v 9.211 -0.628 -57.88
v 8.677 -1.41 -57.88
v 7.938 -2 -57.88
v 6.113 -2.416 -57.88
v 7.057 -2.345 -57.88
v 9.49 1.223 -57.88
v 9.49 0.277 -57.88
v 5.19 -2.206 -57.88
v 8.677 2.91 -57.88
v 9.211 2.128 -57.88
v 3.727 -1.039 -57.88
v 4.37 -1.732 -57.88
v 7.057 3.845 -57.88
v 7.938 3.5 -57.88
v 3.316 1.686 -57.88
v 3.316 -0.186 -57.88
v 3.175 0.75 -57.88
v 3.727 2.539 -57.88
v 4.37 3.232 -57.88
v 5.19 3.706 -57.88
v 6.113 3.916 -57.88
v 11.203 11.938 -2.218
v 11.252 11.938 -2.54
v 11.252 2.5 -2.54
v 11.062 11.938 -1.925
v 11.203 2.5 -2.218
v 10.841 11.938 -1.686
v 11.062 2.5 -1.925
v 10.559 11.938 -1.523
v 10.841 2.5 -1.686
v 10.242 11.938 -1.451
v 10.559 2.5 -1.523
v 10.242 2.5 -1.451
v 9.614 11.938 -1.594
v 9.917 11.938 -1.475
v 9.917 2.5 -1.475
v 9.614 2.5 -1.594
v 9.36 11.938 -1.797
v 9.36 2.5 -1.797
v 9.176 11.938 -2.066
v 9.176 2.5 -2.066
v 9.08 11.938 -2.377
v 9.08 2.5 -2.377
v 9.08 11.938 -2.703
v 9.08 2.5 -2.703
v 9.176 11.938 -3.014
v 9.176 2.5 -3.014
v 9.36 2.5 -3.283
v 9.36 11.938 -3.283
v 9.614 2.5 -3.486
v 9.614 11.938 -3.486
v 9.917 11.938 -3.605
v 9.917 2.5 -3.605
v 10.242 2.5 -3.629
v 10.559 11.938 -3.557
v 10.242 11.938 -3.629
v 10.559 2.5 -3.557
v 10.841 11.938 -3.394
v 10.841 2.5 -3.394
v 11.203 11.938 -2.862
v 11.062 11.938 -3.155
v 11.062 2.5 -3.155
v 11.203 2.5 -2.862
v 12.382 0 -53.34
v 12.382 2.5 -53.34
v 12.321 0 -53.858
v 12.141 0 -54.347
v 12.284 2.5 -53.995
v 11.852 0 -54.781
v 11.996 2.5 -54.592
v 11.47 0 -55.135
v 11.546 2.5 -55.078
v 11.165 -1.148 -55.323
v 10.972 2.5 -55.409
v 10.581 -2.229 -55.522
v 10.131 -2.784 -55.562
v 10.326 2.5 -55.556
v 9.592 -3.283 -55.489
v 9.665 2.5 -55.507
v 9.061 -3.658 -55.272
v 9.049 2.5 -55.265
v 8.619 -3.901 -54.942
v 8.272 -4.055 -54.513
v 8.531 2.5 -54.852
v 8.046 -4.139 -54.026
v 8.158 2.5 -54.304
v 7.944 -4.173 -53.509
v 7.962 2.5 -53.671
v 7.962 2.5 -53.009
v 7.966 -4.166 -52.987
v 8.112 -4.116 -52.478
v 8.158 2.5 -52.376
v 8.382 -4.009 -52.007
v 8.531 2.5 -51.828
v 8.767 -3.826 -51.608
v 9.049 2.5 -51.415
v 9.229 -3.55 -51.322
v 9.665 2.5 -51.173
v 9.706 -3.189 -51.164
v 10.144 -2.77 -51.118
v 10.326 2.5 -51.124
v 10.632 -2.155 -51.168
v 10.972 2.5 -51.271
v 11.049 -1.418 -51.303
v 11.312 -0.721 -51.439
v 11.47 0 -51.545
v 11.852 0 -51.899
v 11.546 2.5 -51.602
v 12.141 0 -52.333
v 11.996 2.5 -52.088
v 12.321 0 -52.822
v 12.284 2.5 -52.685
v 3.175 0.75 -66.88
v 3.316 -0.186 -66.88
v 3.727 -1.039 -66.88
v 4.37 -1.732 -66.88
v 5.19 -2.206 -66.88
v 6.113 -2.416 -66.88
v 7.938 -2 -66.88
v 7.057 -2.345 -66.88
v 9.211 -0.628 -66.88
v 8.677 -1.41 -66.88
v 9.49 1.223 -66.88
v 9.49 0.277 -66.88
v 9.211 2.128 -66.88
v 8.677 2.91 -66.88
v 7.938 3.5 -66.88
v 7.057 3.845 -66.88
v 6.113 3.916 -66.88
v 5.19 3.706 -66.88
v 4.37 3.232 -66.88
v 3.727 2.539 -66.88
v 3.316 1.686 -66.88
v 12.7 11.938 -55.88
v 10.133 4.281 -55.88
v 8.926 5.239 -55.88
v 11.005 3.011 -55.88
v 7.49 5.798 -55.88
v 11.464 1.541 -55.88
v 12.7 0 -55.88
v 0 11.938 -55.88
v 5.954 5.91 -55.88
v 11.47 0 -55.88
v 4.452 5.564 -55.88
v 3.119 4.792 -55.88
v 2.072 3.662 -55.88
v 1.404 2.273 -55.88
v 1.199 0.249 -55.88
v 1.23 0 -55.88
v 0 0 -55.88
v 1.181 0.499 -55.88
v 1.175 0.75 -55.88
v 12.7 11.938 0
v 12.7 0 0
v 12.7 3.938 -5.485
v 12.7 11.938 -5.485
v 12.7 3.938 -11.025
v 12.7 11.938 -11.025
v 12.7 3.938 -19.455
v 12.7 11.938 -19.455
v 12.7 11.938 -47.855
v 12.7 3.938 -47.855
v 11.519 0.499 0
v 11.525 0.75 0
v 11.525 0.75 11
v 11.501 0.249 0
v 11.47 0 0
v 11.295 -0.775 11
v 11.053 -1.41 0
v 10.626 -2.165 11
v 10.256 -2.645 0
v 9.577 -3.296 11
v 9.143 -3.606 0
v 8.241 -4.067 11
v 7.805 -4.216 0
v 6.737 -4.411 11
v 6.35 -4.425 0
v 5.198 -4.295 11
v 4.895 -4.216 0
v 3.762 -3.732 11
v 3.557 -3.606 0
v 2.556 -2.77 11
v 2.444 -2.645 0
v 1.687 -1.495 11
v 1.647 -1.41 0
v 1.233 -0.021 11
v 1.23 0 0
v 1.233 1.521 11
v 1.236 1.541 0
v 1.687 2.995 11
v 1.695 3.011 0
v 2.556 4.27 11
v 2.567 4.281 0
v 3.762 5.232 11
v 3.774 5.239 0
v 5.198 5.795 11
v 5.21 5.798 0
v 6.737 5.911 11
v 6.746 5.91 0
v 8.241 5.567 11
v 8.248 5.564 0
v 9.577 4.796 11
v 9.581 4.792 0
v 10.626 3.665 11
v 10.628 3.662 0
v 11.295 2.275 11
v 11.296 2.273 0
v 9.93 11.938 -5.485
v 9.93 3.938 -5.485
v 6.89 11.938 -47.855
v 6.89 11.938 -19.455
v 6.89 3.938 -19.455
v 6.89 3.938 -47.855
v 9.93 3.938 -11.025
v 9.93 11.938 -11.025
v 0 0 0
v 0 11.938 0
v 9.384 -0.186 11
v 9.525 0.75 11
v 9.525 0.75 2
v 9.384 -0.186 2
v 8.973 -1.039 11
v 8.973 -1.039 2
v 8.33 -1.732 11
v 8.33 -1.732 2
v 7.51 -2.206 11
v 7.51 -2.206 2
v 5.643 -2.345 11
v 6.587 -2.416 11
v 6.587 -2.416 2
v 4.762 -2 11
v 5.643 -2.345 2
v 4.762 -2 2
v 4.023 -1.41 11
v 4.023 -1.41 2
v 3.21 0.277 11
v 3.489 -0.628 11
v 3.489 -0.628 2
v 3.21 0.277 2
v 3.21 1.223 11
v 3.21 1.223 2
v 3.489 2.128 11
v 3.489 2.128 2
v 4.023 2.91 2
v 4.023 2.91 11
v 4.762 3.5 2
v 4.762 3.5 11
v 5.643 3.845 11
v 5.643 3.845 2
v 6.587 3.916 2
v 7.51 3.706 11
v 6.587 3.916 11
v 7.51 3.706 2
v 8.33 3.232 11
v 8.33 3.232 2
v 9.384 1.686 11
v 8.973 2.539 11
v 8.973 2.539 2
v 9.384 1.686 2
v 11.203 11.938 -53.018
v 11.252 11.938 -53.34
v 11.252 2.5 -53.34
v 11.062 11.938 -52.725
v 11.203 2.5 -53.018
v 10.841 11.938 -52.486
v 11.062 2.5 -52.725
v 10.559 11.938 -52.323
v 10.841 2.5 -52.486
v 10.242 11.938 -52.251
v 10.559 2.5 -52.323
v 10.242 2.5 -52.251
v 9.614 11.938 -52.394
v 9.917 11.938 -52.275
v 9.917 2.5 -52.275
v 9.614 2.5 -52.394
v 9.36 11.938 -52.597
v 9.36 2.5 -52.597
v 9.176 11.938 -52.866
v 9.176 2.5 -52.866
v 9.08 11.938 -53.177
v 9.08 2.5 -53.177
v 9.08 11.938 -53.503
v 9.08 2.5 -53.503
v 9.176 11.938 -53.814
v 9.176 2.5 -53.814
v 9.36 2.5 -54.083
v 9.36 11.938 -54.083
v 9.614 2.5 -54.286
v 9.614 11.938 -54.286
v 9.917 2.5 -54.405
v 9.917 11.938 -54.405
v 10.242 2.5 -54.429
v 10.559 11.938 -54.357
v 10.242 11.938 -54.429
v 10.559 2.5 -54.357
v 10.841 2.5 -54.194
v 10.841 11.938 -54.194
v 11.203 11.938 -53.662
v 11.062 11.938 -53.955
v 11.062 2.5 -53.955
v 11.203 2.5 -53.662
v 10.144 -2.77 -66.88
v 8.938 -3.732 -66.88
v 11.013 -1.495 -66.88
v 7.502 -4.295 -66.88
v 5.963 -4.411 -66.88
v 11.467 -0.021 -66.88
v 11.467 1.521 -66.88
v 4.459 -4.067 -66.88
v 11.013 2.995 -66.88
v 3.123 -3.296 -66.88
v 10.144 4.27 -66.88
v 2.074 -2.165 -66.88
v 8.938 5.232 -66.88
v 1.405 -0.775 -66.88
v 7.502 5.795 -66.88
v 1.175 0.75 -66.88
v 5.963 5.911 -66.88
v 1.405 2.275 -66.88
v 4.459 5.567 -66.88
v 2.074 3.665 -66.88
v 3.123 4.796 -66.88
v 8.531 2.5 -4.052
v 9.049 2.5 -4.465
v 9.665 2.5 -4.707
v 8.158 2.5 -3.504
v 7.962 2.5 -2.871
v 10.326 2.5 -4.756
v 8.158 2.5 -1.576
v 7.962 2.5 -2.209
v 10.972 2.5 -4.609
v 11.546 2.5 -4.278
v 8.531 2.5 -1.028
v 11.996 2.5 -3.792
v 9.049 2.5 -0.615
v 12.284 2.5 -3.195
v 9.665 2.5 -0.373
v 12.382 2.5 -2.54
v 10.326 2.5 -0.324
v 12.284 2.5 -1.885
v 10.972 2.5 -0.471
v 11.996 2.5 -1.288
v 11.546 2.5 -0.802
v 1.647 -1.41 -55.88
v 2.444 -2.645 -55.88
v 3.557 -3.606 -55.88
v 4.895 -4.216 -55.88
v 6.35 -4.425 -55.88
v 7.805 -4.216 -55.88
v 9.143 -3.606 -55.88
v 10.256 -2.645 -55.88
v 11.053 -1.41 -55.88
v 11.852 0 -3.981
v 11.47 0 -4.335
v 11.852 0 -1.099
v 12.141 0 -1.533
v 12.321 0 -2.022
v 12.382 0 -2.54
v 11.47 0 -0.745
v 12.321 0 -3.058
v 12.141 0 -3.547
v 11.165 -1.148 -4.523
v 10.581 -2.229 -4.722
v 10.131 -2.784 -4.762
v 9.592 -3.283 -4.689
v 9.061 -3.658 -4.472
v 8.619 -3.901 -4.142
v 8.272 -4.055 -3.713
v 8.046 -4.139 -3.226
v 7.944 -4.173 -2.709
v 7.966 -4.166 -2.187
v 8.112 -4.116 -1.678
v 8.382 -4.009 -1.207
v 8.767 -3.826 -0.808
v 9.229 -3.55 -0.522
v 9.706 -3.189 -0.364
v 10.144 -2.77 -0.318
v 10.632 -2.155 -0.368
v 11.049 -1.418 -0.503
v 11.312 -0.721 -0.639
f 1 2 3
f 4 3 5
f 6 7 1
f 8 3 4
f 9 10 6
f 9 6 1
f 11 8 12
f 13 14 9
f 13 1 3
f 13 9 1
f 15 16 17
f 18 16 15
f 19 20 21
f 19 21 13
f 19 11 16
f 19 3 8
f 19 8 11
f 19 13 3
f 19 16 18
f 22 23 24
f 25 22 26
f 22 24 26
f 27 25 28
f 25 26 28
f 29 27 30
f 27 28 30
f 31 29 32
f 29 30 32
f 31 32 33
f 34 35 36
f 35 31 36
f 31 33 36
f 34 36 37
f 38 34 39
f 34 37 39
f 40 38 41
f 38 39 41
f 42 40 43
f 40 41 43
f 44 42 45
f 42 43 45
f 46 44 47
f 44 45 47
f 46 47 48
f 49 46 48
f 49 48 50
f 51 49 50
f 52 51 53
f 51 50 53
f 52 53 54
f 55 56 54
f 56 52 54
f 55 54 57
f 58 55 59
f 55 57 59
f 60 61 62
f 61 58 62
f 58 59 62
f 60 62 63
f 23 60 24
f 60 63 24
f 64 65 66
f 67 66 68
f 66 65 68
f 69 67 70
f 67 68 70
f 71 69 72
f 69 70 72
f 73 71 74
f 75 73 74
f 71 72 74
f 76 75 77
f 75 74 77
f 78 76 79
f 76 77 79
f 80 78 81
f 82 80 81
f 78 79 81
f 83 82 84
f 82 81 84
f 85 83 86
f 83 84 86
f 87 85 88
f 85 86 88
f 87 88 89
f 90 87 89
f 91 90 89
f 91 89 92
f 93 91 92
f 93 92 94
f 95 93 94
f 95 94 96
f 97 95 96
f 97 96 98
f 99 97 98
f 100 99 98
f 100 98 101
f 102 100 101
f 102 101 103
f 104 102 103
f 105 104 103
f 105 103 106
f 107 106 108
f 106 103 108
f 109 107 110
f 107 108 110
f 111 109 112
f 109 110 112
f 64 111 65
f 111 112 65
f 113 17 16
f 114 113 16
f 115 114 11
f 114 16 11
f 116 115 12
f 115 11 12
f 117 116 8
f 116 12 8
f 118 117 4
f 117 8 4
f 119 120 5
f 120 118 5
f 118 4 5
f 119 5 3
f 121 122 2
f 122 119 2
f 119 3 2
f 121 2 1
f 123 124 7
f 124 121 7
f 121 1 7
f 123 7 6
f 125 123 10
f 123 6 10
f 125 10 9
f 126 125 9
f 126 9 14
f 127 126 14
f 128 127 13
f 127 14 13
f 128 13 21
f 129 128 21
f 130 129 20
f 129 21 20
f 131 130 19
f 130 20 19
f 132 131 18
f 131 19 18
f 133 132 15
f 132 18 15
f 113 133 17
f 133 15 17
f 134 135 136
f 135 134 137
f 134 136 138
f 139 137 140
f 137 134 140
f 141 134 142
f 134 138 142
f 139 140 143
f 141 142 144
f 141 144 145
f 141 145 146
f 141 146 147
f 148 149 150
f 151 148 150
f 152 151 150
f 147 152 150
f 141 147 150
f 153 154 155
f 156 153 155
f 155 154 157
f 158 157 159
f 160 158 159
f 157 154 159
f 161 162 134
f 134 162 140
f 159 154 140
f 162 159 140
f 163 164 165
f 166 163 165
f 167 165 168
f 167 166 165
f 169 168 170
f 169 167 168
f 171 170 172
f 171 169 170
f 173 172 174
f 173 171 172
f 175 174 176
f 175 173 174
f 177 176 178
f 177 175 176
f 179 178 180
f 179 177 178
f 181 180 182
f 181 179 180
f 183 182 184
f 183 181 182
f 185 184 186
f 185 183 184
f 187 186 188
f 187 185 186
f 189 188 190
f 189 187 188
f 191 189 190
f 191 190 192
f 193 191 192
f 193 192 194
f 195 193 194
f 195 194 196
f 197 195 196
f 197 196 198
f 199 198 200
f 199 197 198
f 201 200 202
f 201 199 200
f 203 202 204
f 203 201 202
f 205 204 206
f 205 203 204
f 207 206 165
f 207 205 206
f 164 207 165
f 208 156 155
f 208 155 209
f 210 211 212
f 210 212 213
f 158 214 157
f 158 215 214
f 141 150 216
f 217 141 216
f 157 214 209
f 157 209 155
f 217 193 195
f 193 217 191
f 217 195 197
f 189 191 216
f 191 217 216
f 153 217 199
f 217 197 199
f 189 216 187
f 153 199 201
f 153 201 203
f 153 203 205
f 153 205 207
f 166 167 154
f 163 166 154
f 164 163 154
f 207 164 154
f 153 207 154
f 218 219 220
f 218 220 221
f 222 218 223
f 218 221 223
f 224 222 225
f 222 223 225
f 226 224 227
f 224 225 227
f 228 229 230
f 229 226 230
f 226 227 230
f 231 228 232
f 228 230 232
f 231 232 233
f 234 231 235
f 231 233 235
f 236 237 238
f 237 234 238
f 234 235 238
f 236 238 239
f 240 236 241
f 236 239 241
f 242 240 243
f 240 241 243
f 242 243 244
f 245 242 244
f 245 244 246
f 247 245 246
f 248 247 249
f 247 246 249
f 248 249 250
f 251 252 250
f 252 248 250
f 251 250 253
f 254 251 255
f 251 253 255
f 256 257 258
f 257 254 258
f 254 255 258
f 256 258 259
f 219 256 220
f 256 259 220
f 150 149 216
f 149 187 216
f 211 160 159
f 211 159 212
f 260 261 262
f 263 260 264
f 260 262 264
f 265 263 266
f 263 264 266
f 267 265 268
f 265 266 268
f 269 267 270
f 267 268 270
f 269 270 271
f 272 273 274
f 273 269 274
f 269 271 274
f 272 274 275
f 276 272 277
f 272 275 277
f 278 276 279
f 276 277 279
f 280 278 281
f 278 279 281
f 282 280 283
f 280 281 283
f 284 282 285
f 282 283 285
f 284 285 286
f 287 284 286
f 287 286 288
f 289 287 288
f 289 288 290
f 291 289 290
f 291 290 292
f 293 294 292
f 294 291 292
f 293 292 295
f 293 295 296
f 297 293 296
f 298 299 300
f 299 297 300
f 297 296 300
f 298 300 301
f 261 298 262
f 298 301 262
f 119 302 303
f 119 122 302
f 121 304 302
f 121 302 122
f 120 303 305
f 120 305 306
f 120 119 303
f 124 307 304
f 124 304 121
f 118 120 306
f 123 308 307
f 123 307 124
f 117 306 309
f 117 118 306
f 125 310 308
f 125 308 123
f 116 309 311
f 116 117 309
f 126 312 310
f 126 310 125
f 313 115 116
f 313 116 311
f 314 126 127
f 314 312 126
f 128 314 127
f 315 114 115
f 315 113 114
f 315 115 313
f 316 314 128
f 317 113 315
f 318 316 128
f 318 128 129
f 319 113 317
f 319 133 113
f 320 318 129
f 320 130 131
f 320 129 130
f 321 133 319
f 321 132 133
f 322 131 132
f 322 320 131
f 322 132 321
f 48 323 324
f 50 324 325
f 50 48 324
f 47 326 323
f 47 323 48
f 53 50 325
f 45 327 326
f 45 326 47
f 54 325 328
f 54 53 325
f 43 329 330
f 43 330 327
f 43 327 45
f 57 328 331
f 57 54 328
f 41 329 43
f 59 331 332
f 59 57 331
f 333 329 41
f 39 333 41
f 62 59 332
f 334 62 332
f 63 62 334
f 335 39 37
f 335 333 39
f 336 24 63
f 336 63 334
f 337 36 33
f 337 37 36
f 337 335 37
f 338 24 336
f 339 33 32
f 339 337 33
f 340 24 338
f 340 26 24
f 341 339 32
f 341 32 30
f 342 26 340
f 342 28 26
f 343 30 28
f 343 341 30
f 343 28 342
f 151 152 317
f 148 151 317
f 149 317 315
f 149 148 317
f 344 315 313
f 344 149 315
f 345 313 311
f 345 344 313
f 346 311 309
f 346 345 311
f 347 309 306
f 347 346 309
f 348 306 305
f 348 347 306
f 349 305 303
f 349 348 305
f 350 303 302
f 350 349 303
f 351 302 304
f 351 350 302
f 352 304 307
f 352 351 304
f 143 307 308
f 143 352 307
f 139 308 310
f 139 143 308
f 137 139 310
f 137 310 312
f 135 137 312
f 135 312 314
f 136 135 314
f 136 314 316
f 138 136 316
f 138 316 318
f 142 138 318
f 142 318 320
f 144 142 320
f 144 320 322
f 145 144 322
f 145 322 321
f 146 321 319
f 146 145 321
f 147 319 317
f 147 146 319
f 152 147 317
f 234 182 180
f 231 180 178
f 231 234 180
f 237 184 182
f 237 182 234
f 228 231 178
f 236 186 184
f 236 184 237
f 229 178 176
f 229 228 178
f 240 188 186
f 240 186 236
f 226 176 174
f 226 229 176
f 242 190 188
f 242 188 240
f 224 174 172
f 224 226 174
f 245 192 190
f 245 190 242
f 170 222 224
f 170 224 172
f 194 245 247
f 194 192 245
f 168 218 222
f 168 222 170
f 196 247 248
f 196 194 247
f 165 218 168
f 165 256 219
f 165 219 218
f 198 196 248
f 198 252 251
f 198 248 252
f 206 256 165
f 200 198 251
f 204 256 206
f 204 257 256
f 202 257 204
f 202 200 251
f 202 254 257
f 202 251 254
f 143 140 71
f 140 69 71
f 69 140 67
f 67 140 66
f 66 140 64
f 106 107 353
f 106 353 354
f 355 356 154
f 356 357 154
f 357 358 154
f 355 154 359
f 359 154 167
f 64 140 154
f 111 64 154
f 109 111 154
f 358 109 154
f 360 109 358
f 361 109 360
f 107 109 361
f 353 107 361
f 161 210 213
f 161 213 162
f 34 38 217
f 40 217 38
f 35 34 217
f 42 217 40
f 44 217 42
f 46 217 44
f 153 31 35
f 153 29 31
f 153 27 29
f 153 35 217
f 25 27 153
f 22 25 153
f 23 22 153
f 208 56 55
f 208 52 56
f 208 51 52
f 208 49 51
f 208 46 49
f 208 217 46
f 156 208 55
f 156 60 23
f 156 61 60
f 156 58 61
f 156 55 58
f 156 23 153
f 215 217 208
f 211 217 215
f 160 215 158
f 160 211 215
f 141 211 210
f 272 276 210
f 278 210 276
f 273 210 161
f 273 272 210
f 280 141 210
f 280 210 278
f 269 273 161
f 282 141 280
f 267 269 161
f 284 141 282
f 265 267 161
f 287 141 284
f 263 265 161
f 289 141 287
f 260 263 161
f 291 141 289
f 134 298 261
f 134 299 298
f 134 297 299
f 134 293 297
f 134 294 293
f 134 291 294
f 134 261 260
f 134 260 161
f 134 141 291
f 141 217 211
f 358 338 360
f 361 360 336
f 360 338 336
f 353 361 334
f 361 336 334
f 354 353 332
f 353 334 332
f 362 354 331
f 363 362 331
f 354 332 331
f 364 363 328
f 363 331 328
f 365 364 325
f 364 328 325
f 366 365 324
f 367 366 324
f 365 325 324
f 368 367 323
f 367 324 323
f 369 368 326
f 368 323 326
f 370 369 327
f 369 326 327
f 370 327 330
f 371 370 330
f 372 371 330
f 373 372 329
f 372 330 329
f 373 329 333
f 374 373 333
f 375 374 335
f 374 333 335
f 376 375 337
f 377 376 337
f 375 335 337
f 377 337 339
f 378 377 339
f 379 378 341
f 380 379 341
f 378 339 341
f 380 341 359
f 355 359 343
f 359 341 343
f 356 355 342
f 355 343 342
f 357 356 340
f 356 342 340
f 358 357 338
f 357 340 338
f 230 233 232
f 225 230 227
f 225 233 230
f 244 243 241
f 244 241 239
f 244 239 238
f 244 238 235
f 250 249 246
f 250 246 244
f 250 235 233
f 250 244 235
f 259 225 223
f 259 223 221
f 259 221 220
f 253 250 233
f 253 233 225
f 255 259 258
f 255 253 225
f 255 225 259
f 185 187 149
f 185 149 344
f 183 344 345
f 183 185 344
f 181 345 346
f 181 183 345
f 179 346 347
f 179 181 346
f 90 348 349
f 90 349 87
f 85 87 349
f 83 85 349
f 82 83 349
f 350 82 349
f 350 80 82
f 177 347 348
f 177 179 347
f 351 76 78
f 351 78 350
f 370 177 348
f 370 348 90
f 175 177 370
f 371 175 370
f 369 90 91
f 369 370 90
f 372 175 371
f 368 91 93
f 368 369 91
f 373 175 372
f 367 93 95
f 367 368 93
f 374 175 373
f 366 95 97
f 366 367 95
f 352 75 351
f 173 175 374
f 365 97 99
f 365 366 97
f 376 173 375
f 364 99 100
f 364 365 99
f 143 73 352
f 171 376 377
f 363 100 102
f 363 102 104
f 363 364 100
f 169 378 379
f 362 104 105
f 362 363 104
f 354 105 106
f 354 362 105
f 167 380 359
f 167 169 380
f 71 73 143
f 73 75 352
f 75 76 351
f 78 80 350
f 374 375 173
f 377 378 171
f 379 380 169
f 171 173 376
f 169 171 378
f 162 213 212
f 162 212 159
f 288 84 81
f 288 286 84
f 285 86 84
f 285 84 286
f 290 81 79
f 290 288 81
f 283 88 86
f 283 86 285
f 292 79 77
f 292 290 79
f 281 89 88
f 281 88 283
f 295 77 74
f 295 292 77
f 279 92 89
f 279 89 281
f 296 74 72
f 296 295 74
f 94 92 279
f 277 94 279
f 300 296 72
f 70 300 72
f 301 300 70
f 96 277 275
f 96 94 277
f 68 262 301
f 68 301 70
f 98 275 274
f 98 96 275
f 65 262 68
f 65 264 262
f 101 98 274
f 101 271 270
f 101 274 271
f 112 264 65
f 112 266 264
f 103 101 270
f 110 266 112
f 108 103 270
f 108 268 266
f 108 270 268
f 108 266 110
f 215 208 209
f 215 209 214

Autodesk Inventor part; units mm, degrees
ref_plane "YZ Plane" through (0, 0, 0) normal (1, 0, 0) x (0, 1, 0)
ref_plane "XZ Plane" through (0, 0, 0) normal (0, 1, 0) x (-1, 0, 0)
ref_plane "XY Plane" through (0, 0, 0) normal (0, 0, 1) x (1, 0, 0)
sketch "Sketch1" plane through (0, 0, 0) normal (0, 1, 0) x (-1, 0, 0)
  line L0 (0, -55.88) -> (-12.7, -55.88)
  line L1 (-12.7, 0) -> (0, 0)
  line L2 (0, 0) -> (0, -20.94)
  line L3 (0, -34.94) -> (0, -55.88)
  line L4 (-12.7, -55.88) -> (-12.7, -34.94)
  line L5 (-12.7, -20.94) -> (-12.7, 0)
  line L6 (0, -20.94) -> (0, -34.94)
  line L7 (-12.7, -20.94) -> (-12.7, -34.94)
  dimension "d1" = 55.88
  dimension "d2" = 12.7
extrude "Extrusion1" add sketch "Sketch1" along normal blind 1.5
sketch "Sketch2" plane through (0, 1.5, 0) normal (0, 1, 0) x (1, 0, 0)
  line L0 (12.7, 0) -> (12.7, 55.88) projected
  line L1 (12.7, 0) -> (10.16, 0)
  line L2 (12.7, 2.54) -> (12.7, 0)
  circle A0 centre (10.16, 2.54) radius 1.092
  circle A1 centre (10.16, 53.34) radius 1.092
  point P0 (0, 0)
  dimension "d8" = 2.184
  dimension "d10" = 2.184
extrude "Extrusion2" cut sketch "Sketch2" against normal blind 1.5
sketch "Sketch5" plane through (0, 0, 0) normal (0, 0, 1) x (1, 0, 0)
  line L0 (12.7, 0) -> (0, 0) projected
  line L1 (6.35, 0) -> (6.35, 1.5)
  line L2 (12.7, 1.5) -> (0, 1.5) projected
  line L3 (0, 0) -> (0, 1.5) projected
  line L4 (0, 0.75) -> (12.7, 0.75)
  line L5 (12.7, 0) -> (12.7, 1.5) projected
  circle A0 centre (6.35, 0.75) radius 5.175
  dimension "d30" = 10.35
extrude "Extrusion5" add sketch "Sketch5" along normal blind 2 contours A0 L0 | L0 L1 L4 A0 | L0 A0 L4 L1 | L4 L1 L2 A0 | L4 A0 L2 L1 | L2 A0
sketch "Sketch6" plane through (6.35, 0.75, 2) normal (0, 0, 1) x (1, 0, 0)
  circle A0 centre (0, 0) radius 5.175
  circle A1 centre (0, 0) radius 3.175
  point P0 (-6.35, -0.75)
  dimension "d35" = 6.35
extrude "Extrusion6" add sketch "Sketch6" along normal blind 9
sketch "Sketch7" plane through (12.7, 0, -55.88) normal (0, 0, -1) x (-1, 0, 0)
  line L0 (0, 0) -> (0, 1.5) projected
  line L1 (0, 0.75) -> (12.7, 0.75)
  line L2 (12.7, 0) -> (12.7, 1.5) projected
  line L3 (11.4704, 1.5) -> (1.2296, 1.5) projected
  line L4 (6.35, 1.5) -> (6.35, 0)
  circle A0 centre (6.35, 0.75) radius 5.175
extrude "Extrusion7" add sketch "Sketch7" along normal blind 2
sketch "Sketch8" plane through (6.35, 0.75, -57.88) normal (0, 0, -1) x (-1, 0, 0)
  circle A0 centre (0, 0) radius 5.175
  circle A1 centre (0, 0) radius 3.175
  point P0 (6.35, -0.75)
  dimension "d40" = 6.35
extrude "Extrusion8" add sketch "Sketch8" along normal blind 9
thread "Thread1" size "1/4-20 UNC" class "2B" standard "ANSI Unified Screw Threads" full length
thread "Thread2" size "1/4-20 UNC" class "2B" standard "ANSI Unified Screw Threads" full length
sketch "Sketch9" plane through (0, 0, 0) normal (0, 0, -1) x (-1, 0, 0)
  arc A0 (-11.4704, 0) -> (-1.2296, 0) centre (-6.35, 0.75) ccw projected
  line L0 (0, 0) -> (-1.2296, 0) projected
  line L1 (-11.4704, 0) -> (-1.2296, 0)
  circle A1 centre (-6.35, 0.75) radius 5.175
extrude "Extrusion9" add sketch "Sketch9" along normal up to next contours L1 A0
sketch "Sketch10" plane through (10.16, 0, -2.54) normal (0, 1, 0) x (1, 0, 0)
  circle A0 centre (0, 0) radius 1.092
  circle A1 centre (0, 50.8) radius 1.092 projected
  circle A2 centre (0, 50.8) radius 1.092
  point P0 (-10.16, -2.54)
  dimension "d60" = 2.184
extrude "Extrusion10" cut sketch "Sketch10" against normal up to next
sketch "Sketch12" plane through (0, 1.5, 0) normal (0, 1, 0) x (1, 0, 0)
  circle A0 centre (10.16, 2.54) radius 1.092 projected
  circle A1 centre (10.16, 2.54) radius 1.092
  circle A2 centre (10.16, 2.54) radius 2.2225
  circle A3 centre (10.16, 53.34) radius 1.092 projected
  circle A4 centre (10.16, 53.34) radius 1.092
  circle A5 centre (10.16, 53.34) radius 2.2225
  point P0 (0, 0)
  dimension "d54" = 4.445
  dimension "d55" = 4.445
extrude "Extrusion11" cut sketch "Sketch12" against normal blind 5.925
sketch "Sketch13" plane through (0, 1.5, 0) normal (0, 1, 0) x (1, 0, 0)
  line L0 (12.7, 0) -> (12.7, 55.88) projected
  line L1 (12.7, 55.88) -> (0, 55.88)
  line L2 (0, 55.88) -> (0, 0)
  line L3 (0, 0) -> (12.7, 0)
  line L4 (12.7, 0) -> (12.7, 55.88)
  circle A0 centre (10.16, 53.34) radius 1.092 projected
  circle A1 centre (10.16, 53.34) radius 1.092
  circle A2 centre (10.16, 2.54) radius 1.092 projected
  circle A3 centre (10.16, 2.54) radius 1.092
extrude "Extrusion12" add sketch "Sketch13" along normal blind 10.4375
thread "Thread5" size "2-56 UNC" class "2B" standard "ANSI Unified Screw Threads" full length
thread "Thread6" size "2-56 UNC" class "2B" standard "ANSI Unified Screw Threads" full length
sketch "Sketch14" plane through (10.16, 1.5, -53.34) normal (0, -1, 0) x (1, 0, 0)
  circle A0 centre (0, 0) radius 1.092 projected
  circle A1 centre (0, 0) radius 2.2225
  circle A2 centre (0, 50.8) radius 2.2225 projected
  circle A3 centre (0, 50.8) radius 2.2225
  circle A4 centre (0, 0) radius 1.092
  circle A5 centre (0, 50.8) radius 1.092
  point P0 (-10.16, 53.34)
extrude "Extrusion13" cut sketch "Sketch14" against normal blind 1
sketch "Sketch15" plane through (0, 11.9375, 0) normal (0, 1, 0) x (1, 0, 0)
  line L0 (12.7, 0) -> (12.7, 6.985)
  line L1 (12.7, 0) -> (12.7, 55.88) projected
  line L2 (12.7, 0) -> (19.685, 0) construction
  line L3 (11.525, -11) -> (11.525, 66.88) projected
  line L4 (11.43, 6.985) -> (13.97, 6.985) construction
  line L5 (11.43, 6.985) -> (12.43, 6.985) construction
  line L6 (11.43, 9.525) -> (12.43, 9.525) construction
  line L7 (12.7, 5.985) -> (12.7, 10.525)
  line L8 (12.7, 5.985) -> (12.7, 5.485)
  line L9 (12.7, 5.485) -> (9.93, 5.485)
  line L10 (9.93, 5.485) -> (9.93, 11.025)
  line L11 (9.93, 11.025) -> (12.7, 11.025)
  line L12 (12.7, 11.025) -> (12.7, 10.525)
  point P0 (0, 0)
  dimension "d72" = 90
  dimension "d130" = 0.5
  dimension "d131" = 2.77
  dimension "d132" = 5.54
extrude "Extrusion14" cut sketch "Sketch15" against normal blind 8
sketch "Sketch16" plane through (0, 11.9375, 0) normal (0, 1, 0) x (1, 0, 0)
  line L0 (12.7, 0) -> (12.7, 55.88) projected
  line L1 (12.7, 40.234) -> (13.97, 40.234) construction
  line L2 (0, 0) -> (12.7, 0) projected
  line L3 (11.43, 0) -> (40.005, 0) construction
  line L4 (11.525, -11) -> (11.525, 66.88) projected
  line L5 (11.43, 28.575) -> (13.97, 28.575) construction
  line L6 (11.43, 46.355) -> (12.43, 46.355) construction
  line L7 (11.43, 28.575) -> (13.97, 28.575) construction
  line L8 (11.43, 20.955) -> (12.43, 20.955) construction
  line L9 (6.89, 19.955) -> (6.89, 47.355)
  line L10 (12.7, 47.355) -> (12.7, 19.955)
  line L11 (6.89, 47.355) -> (6.89, 47.855)
  line L12 (6.89, 47.855) -> (12.7, 47.855)
  line L13 (12.7, 47.855) -> (12.7, 47.355)
  line L14 (12.7, 19.955) -> (12.7, 19.455)
  line L15 (12.7, 0) -> (12.7, 55.88) projected
  line L16 (12.7, 19.455) -> (6.89, 19.455)
  line L17 (6.89, 19.455) -> (6.89, 19.955)
  point P0 (12.7, 10.525)
  dimension "d123" = 5.81
  dimension "d129" = 28.4
extrude "Extrusion15" cut sketch "Sketch16" against normal blind 8 contours L16 L4 L12 L0 | L16 L17 L9 L11 L12 L4
properties part number "Line Sensor 6 Bracket"
